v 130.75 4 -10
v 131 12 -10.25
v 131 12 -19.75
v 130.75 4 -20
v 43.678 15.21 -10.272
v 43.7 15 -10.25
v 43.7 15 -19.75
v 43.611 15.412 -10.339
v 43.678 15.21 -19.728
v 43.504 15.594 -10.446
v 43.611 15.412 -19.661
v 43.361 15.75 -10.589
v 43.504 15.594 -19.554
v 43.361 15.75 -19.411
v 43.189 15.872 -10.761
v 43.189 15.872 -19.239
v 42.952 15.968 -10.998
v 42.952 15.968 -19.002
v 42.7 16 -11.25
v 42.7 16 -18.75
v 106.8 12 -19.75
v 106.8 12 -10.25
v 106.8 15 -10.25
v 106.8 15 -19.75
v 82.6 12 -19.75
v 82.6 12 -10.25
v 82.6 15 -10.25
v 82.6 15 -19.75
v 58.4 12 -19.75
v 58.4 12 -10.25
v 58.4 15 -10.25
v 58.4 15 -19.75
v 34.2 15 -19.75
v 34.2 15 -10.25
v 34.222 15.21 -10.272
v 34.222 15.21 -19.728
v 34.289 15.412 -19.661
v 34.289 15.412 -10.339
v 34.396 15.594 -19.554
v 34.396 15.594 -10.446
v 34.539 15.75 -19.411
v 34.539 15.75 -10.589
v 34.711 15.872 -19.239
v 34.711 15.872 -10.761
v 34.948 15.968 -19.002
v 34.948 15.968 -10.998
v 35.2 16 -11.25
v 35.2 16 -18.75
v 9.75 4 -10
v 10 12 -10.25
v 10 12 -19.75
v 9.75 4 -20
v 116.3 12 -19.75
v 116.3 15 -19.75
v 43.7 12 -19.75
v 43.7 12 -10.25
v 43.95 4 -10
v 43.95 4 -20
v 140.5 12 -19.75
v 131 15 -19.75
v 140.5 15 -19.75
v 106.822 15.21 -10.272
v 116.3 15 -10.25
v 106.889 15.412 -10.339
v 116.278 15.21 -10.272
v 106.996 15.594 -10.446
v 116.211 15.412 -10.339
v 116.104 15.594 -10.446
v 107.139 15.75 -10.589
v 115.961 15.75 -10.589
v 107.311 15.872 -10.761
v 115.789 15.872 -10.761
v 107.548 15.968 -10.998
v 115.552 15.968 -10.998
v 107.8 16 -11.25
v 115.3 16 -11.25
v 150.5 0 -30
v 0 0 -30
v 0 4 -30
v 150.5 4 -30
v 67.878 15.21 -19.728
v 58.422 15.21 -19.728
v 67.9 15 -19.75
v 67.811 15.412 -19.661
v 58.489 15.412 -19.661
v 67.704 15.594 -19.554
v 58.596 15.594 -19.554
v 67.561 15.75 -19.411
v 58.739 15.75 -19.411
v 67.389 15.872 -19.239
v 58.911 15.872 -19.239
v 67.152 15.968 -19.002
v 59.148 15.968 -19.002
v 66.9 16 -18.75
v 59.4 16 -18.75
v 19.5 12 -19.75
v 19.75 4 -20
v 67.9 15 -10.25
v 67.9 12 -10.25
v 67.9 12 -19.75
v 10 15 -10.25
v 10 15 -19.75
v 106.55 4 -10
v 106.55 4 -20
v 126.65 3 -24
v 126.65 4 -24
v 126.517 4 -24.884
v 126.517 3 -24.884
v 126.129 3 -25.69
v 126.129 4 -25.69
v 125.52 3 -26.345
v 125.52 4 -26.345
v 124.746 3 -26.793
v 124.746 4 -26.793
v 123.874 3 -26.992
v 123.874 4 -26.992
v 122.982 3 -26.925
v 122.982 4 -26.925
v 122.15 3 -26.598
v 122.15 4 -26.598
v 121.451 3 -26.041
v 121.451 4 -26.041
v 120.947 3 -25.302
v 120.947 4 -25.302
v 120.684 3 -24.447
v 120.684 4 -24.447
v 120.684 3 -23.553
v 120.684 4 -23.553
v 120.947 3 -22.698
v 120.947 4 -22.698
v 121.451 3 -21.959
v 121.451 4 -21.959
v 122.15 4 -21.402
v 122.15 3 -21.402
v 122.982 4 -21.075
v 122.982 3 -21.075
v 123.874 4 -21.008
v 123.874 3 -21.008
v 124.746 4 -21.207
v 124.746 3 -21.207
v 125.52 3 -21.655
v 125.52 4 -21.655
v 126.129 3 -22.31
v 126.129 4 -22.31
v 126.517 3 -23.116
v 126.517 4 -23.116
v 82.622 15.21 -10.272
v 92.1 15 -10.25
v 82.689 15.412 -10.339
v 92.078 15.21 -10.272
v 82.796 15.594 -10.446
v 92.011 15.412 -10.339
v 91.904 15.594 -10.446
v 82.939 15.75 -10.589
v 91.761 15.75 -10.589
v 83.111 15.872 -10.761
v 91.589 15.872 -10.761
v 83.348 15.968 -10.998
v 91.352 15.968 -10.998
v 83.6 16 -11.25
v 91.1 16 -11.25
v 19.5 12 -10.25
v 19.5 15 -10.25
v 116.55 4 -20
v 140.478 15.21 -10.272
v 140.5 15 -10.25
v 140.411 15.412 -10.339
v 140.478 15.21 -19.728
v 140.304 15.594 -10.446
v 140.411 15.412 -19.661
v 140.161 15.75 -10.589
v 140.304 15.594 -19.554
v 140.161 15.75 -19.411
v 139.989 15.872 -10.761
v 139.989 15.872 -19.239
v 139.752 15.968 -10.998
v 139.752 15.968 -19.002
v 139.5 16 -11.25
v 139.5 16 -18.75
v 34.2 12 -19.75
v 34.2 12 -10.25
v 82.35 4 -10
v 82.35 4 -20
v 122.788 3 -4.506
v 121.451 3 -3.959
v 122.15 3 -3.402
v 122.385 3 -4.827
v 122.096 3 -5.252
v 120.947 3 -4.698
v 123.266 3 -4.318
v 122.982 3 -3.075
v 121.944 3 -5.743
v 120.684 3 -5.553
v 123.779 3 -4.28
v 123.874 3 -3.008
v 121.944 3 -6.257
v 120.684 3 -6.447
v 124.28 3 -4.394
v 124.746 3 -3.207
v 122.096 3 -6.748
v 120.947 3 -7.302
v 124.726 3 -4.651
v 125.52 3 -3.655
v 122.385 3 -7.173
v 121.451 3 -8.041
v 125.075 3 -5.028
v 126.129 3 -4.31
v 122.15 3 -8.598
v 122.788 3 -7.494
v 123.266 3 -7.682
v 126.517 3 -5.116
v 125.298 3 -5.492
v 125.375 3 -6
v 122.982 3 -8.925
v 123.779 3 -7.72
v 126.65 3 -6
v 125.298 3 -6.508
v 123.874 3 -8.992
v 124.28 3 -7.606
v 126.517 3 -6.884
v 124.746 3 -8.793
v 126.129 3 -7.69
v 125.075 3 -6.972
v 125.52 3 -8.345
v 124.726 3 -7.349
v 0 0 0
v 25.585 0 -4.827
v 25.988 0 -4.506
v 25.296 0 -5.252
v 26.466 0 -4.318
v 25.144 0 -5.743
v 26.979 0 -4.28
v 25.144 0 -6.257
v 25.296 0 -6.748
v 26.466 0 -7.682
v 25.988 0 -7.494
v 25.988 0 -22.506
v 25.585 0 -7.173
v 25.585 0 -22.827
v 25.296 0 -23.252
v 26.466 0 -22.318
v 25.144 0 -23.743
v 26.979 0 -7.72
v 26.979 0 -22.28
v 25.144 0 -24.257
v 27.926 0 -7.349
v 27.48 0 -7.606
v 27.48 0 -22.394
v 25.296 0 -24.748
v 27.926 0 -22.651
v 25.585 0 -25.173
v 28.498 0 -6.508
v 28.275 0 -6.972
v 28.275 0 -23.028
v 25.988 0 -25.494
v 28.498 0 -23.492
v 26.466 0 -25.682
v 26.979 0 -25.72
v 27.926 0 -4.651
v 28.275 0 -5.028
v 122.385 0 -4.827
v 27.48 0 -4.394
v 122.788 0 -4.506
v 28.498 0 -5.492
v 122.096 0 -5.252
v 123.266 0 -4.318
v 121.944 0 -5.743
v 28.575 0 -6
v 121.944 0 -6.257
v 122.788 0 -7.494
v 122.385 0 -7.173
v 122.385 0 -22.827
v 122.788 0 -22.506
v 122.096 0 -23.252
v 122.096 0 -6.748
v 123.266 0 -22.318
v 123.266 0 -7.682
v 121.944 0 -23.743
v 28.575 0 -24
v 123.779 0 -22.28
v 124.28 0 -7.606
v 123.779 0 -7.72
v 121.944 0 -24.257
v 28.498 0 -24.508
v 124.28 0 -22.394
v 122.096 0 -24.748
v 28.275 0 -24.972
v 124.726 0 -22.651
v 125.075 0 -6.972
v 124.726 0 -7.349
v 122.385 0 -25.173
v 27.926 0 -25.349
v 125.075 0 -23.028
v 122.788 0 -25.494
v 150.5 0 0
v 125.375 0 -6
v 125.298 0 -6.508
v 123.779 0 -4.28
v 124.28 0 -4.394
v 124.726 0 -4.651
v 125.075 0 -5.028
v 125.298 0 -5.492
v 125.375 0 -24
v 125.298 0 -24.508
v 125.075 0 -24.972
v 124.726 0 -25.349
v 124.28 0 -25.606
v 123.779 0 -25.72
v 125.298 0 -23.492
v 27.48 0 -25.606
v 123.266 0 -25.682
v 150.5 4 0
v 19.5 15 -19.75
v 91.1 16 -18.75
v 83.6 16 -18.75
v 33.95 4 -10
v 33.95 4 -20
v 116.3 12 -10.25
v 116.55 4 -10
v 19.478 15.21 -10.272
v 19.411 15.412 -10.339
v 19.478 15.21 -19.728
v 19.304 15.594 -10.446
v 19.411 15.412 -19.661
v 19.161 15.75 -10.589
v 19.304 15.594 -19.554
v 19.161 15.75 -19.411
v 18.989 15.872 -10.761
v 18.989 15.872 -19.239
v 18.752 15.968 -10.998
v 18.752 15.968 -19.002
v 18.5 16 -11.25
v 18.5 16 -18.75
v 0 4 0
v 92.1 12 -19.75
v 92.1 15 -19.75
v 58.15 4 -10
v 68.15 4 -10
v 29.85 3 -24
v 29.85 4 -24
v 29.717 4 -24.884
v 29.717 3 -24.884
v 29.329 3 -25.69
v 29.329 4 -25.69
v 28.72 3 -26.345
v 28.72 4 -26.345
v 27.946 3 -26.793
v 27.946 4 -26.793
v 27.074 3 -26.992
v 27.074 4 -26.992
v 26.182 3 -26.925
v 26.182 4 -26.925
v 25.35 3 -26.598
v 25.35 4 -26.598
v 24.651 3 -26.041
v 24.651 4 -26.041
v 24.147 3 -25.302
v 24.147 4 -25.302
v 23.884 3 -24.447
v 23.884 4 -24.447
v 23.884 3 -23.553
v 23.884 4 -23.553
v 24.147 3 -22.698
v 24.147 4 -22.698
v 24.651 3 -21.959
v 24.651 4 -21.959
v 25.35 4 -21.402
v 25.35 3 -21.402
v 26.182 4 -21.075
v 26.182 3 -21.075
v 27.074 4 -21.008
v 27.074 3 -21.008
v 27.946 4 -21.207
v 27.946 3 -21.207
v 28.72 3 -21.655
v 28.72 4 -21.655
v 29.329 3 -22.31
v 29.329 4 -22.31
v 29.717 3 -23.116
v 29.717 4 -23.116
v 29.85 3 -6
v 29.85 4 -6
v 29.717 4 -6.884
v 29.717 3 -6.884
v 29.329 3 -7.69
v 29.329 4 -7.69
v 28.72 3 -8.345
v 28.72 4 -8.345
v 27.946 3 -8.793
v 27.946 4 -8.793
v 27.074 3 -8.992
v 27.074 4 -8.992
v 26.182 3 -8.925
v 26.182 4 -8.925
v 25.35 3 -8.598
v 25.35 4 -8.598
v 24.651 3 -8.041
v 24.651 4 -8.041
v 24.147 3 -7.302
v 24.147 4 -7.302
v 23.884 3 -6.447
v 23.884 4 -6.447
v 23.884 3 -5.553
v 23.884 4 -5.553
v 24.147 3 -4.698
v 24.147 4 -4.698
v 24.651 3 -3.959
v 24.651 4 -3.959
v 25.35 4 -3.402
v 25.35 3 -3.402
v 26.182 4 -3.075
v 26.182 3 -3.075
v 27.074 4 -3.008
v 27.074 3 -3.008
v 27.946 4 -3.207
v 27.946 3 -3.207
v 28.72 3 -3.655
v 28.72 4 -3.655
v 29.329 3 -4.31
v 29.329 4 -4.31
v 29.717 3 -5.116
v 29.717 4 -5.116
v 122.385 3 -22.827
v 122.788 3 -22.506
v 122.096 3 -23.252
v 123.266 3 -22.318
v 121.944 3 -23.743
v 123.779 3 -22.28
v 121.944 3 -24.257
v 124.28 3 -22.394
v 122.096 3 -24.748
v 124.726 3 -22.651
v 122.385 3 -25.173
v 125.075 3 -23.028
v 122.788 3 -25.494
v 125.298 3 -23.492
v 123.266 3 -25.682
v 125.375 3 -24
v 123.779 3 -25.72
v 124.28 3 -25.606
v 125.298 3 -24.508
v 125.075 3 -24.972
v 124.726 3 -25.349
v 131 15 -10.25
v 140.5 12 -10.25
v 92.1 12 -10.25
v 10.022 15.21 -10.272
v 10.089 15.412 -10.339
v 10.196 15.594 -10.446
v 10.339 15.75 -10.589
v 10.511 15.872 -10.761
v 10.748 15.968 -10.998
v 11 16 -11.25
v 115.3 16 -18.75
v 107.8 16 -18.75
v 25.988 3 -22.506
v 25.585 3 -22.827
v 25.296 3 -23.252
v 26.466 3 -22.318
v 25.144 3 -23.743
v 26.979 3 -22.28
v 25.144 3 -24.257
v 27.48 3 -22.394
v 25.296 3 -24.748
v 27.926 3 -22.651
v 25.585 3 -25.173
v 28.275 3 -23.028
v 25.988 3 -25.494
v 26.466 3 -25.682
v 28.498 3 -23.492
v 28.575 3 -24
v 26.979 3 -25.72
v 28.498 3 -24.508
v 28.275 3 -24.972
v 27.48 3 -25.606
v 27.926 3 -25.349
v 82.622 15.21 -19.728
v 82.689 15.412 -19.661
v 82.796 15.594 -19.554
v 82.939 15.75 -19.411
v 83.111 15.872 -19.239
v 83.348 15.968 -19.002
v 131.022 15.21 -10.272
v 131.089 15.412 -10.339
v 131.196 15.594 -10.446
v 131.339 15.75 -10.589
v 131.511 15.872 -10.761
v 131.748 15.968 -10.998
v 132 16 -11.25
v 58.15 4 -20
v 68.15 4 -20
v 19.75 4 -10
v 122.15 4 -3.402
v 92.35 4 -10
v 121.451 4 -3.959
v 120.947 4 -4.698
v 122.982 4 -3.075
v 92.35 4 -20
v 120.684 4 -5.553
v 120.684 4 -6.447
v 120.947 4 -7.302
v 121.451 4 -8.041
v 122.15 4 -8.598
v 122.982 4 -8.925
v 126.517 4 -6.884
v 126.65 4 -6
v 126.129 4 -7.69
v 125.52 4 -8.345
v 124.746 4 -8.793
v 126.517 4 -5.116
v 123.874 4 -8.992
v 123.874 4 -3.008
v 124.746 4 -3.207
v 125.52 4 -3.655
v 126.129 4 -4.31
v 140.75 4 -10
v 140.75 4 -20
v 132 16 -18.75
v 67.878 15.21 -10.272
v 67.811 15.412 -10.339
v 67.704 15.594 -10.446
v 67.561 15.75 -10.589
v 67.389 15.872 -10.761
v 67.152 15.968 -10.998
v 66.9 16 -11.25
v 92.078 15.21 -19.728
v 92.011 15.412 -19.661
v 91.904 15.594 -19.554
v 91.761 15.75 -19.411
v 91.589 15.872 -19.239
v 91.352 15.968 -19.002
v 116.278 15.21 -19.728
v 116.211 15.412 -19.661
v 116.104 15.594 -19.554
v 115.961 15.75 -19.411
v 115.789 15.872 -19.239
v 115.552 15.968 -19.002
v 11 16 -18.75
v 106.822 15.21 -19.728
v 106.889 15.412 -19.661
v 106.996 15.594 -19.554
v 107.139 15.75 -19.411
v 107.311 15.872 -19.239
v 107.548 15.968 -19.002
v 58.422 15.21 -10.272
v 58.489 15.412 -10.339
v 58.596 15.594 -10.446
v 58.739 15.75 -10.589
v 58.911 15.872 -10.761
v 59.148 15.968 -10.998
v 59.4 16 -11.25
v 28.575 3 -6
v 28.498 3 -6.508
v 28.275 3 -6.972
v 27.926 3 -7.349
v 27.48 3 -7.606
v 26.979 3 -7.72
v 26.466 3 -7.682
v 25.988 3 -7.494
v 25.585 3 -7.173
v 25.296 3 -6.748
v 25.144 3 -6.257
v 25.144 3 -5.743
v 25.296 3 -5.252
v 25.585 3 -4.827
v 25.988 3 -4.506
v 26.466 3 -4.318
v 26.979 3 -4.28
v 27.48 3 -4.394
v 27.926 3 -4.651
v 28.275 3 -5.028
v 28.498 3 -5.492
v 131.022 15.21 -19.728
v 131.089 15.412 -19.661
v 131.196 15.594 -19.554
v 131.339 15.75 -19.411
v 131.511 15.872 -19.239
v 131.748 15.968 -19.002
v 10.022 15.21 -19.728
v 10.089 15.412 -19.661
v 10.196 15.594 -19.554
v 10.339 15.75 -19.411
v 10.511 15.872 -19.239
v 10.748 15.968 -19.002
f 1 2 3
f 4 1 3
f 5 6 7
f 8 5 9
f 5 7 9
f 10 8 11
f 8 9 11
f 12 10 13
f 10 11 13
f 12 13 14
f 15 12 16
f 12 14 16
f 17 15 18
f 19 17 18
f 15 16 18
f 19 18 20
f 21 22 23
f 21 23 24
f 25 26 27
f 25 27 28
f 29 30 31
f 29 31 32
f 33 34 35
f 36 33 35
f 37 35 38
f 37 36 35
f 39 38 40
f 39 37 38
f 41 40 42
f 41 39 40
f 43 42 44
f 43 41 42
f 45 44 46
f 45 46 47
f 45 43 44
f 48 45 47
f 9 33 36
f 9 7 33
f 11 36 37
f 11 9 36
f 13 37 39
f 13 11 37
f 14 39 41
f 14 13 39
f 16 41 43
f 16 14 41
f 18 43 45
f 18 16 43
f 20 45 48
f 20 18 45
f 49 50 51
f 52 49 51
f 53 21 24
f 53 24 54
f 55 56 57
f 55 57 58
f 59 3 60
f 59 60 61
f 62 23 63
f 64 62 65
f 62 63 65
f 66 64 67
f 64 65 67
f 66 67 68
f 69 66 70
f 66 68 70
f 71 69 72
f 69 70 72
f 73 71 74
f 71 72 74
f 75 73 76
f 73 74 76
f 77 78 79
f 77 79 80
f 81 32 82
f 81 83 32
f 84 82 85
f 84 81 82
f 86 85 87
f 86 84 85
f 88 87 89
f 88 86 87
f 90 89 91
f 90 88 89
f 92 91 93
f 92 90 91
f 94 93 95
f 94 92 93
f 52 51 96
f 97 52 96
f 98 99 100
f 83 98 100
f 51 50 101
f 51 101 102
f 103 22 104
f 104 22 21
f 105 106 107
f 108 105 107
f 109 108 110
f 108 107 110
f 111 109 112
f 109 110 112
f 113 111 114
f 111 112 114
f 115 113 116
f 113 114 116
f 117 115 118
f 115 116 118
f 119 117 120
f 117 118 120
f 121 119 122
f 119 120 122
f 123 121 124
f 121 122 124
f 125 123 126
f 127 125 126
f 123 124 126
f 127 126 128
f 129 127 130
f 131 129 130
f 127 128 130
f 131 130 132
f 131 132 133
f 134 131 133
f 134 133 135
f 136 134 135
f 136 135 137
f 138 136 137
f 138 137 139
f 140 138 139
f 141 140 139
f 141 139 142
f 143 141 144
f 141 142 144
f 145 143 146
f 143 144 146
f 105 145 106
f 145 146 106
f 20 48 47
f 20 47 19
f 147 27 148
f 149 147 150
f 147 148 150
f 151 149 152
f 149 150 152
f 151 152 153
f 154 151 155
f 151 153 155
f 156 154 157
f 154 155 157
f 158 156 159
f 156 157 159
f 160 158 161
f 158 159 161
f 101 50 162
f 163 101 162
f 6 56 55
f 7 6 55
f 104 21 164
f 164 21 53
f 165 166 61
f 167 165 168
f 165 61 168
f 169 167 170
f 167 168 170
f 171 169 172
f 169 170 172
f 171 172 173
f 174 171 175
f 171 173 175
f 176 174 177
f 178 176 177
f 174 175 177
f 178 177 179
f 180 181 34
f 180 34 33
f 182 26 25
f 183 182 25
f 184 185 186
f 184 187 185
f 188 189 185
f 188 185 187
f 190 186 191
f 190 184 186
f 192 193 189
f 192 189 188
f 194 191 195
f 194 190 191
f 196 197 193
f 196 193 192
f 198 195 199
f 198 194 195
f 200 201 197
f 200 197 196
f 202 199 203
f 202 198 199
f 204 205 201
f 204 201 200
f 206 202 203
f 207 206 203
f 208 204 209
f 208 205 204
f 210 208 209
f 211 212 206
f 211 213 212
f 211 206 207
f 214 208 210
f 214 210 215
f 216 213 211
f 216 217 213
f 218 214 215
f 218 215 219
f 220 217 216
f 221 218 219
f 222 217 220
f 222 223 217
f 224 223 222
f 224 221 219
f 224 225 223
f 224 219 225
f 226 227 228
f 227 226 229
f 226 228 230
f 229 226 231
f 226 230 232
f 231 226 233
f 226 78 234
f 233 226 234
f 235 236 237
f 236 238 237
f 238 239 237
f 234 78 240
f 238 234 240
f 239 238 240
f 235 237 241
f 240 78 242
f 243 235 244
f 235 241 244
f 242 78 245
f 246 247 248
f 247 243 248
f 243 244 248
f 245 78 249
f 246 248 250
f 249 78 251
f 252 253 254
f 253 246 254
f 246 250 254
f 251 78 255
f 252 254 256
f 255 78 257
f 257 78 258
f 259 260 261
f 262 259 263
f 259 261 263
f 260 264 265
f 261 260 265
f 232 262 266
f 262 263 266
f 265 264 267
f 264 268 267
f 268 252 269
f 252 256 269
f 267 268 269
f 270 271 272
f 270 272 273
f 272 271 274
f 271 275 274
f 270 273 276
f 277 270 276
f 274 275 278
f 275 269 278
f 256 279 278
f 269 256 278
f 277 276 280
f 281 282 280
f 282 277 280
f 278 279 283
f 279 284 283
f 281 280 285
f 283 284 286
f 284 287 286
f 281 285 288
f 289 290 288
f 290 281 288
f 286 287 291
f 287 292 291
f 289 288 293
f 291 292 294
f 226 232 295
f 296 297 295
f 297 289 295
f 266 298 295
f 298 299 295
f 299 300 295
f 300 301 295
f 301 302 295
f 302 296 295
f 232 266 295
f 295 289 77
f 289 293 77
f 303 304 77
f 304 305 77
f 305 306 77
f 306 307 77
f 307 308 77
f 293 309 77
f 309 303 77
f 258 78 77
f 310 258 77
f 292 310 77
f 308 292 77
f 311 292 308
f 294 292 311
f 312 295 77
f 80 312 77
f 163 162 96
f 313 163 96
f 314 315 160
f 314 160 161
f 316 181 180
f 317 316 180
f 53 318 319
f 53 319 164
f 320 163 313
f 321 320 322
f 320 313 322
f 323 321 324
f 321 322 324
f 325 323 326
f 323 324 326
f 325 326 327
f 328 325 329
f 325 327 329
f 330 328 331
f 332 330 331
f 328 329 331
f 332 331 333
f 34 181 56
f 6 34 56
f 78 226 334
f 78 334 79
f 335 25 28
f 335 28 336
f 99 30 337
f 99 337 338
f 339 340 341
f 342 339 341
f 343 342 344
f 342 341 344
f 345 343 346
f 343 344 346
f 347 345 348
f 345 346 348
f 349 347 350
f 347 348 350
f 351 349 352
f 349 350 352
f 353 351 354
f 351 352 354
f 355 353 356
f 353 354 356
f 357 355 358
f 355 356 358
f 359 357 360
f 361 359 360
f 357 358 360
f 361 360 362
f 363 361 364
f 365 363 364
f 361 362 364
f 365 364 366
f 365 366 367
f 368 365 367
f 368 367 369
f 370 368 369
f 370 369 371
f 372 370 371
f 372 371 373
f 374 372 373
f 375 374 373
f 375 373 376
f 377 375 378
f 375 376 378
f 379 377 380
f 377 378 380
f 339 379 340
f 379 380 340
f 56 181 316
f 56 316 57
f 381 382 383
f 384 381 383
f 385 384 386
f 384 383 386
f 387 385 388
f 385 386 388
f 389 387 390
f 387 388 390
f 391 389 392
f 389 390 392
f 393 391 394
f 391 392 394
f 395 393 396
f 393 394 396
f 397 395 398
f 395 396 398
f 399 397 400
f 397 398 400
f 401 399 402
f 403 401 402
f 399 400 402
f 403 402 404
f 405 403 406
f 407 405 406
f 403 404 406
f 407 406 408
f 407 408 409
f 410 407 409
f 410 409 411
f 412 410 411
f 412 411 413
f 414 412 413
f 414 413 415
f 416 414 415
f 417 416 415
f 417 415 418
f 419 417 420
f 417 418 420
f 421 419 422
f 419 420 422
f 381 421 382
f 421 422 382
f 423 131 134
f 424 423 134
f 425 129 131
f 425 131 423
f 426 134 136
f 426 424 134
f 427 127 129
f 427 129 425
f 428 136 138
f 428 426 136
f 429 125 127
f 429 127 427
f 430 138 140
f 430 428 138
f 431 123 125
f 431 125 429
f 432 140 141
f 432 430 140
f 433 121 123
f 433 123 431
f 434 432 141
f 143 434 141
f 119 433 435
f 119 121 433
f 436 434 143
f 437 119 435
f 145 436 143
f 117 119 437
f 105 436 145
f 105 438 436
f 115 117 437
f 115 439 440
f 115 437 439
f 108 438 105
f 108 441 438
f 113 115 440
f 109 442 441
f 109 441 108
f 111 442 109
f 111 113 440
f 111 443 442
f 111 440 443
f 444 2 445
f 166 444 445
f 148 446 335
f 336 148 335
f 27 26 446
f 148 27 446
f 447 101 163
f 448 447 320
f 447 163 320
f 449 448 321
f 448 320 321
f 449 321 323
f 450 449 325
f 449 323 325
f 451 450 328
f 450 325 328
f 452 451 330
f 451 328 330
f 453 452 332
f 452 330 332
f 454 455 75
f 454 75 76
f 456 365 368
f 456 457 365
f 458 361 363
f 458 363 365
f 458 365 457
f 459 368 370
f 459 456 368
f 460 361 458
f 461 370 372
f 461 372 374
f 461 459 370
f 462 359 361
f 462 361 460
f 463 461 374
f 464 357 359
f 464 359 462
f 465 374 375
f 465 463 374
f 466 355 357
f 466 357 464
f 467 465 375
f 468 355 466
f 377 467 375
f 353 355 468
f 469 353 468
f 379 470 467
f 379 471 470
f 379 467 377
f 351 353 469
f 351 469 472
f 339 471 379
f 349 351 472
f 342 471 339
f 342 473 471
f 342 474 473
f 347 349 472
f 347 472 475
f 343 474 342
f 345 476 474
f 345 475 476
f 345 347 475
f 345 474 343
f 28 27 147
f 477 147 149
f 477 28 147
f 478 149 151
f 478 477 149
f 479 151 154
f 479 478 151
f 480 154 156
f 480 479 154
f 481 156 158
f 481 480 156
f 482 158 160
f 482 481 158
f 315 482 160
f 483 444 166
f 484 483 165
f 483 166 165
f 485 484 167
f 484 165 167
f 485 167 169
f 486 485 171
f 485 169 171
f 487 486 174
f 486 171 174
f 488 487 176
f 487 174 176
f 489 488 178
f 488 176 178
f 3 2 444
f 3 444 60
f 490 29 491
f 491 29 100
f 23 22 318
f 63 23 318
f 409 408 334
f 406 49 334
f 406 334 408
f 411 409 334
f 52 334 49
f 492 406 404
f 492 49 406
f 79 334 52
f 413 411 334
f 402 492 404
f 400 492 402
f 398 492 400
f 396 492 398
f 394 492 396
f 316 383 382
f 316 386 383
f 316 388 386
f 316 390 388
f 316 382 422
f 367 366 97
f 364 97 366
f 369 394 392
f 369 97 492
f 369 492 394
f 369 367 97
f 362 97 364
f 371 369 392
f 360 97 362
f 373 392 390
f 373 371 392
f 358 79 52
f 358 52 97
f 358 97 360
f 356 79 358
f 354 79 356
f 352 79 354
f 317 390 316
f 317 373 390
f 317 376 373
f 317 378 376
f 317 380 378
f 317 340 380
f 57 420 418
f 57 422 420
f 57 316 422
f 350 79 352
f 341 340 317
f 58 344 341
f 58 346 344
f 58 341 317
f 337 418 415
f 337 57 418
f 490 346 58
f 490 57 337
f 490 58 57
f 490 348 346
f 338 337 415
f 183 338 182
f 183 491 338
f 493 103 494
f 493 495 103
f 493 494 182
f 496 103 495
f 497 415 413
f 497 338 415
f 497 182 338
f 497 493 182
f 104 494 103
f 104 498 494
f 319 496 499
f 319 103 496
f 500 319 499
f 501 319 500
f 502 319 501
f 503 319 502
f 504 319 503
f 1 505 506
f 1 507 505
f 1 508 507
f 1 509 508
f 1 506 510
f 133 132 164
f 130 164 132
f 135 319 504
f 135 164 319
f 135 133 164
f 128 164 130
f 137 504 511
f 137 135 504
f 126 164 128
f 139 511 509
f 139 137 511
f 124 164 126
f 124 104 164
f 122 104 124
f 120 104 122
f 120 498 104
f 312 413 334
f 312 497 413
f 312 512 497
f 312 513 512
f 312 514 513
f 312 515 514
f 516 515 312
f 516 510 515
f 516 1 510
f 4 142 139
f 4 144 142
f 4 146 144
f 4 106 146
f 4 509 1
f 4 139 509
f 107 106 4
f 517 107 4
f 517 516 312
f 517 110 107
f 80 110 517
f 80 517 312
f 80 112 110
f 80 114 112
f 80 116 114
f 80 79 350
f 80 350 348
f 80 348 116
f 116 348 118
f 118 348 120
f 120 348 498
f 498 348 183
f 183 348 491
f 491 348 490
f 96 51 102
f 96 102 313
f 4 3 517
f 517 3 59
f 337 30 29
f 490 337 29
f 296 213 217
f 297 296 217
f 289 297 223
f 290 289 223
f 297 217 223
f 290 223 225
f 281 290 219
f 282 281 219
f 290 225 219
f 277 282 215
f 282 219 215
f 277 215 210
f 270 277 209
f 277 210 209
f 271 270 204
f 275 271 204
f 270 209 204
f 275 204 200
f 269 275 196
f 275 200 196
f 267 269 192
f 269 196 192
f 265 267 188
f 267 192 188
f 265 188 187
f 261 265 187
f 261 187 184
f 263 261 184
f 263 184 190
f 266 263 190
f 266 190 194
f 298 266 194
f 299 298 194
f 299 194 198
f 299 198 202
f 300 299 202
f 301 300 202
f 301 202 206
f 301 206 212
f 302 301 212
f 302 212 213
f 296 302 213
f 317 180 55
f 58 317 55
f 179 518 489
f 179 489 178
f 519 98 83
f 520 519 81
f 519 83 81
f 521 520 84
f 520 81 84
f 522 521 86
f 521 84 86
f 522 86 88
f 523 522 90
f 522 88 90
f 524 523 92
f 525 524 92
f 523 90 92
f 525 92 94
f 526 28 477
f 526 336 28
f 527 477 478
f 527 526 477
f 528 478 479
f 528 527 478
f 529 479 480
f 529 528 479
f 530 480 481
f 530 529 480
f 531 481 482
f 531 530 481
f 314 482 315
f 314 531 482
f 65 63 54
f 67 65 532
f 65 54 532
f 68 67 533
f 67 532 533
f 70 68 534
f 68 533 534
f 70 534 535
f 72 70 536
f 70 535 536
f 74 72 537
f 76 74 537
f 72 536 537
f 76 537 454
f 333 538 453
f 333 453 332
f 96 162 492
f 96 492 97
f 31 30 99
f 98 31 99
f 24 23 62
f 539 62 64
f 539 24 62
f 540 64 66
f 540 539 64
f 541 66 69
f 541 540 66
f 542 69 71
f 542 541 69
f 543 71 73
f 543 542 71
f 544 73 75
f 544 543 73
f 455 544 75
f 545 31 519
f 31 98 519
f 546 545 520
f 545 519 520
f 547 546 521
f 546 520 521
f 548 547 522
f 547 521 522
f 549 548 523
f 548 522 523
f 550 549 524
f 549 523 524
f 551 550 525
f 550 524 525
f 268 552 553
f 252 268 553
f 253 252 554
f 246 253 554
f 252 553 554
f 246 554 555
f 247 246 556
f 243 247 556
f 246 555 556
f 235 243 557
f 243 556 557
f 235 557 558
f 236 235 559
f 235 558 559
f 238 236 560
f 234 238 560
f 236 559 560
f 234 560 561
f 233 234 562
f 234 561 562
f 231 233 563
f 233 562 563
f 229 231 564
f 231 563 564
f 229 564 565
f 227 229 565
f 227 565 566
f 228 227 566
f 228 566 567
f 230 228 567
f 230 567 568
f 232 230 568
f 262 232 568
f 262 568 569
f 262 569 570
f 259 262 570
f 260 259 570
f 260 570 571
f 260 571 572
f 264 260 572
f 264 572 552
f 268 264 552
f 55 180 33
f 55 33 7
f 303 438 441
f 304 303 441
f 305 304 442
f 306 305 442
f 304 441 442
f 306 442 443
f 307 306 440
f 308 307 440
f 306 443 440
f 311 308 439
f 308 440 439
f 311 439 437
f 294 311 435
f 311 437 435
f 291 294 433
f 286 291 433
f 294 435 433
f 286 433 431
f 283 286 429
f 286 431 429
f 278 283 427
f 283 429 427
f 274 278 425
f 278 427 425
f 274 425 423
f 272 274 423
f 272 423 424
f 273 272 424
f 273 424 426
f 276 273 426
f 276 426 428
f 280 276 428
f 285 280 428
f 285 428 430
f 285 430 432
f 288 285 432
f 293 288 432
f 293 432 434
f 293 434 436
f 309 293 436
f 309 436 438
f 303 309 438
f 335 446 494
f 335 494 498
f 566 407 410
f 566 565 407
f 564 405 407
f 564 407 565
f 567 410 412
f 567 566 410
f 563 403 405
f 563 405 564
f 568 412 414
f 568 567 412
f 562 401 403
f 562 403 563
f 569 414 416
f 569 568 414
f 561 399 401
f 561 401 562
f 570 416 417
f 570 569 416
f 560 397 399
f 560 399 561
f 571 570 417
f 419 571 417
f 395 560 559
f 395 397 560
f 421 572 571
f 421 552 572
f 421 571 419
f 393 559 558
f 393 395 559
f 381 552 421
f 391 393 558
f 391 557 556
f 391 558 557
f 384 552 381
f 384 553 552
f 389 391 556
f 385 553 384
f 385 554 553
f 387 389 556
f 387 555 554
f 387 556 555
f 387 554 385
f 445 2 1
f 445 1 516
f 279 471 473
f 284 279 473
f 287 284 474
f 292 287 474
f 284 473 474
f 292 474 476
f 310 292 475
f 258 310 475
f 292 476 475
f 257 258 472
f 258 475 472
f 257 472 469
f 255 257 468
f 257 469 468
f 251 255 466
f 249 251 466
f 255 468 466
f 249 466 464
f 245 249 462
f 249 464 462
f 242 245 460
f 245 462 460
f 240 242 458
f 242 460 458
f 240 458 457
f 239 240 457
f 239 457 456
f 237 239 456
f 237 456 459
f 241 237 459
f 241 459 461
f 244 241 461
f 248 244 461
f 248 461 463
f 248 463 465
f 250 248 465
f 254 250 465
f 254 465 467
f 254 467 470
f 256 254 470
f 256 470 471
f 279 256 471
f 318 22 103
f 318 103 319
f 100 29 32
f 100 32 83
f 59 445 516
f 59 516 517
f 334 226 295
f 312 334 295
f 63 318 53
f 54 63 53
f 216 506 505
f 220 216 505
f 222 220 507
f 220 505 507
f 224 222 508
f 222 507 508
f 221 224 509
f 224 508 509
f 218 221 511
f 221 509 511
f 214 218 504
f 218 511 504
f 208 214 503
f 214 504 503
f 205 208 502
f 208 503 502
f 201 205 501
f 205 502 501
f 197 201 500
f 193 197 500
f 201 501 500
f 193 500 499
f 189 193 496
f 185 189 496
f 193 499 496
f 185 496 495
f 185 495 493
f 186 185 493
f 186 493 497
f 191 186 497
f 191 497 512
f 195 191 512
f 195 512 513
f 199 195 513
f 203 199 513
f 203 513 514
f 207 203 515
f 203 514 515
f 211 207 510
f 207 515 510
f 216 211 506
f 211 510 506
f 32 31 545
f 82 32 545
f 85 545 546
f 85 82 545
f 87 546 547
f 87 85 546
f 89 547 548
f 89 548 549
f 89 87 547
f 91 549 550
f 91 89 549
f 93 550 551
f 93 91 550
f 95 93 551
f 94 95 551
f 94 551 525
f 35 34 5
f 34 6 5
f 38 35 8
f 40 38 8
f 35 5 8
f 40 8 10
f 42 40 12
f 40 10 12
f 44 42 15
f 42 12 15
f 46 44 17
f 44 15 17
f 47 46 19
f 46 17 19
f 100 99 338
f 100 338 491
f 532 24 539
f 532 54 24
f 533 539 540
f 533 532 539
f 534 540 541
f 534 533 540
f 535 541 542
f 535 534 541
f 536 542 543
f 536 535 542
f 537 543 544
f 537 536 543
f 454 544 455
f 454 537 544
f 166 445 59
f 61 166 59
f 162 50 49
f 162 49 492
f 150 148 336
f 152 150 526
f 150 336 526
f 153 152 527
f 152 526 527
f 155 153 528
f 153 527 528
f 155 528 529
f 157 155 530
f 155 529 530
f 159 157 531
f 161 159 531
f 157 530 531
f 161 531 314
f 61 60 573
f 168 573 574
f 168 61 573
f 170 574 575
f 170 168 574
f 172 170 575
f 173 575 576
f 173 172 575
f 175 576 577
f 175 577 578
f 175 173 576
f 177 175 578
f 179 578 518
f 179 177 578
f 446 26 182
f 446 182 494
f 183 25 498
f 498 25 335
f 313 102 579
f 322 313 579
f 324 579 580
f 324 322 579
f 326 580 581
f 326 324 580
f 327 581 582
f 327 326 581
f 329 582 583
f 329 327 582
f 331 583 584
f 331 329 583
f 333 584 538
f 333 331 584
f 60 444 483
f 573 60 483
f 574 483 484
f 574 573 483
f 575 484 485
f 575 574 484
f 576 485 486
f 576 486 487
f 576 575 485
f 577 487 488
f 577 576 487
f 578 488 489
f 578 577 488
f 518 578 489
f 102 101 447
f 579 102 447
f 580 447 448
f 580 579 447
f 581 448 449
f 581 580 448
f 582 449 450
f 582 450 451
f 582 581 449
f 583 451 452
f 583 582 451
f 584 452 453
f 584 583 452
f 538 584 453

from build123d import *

# Parameters (mm, degrees)
SKETCH1_W                = 150.5
SKETCH1_H                = 30
SKETCH1_W_2              = 9.5
SKETCH1_H_2              = 9.5
BOSS_EXTRUDE1_DEPTH      = 4
SKETCH2_W                = 9.5
SKETCH2_H                = 9.5
BOSS_EXTRUDE2_DEPTH      = 12
BOSS_EXTRUDE2_DEPTH_BACK = 4
FILLET1_R                = 1
CHAMFER1_SIZE            = 0.25
CHAMFER1_SIZE2           = 8
SKETCH3_R                = 1.725
CUT_EXTRUDE1_DEPTH       = 5
SKETCH4_R                = 3
CUT_EXTRUDE2_DEPTH       = 1


with BuildPart() as part:
    # Sketch1 → Boss-Extrude1 (new body)
    with BuildSketch(Plane(origin=(0, 0, 0), x_dir=(1, 0, 0), z_dir=(0, 1, 0))):
        with Locations((75.25, 15)):
            Rectangle(SKETCH1_W, SKETCH1_H)
        with Locations((14.75, 15)):
            Rectangle(SKETCH1_W_2, SKETCH1_H_2, mode=Mode.SUBTRACT)
        with Locations((38.95, 15)):
            Rectangle(SKETCH1_W_2, SKETCH1_H_2, mode=Mode.SUBTRACT)
        with Locations((63.15, 15)):
            Rectangle(SKETCH1_W_2, SKETCH1_H_2, mode=Mode.SUBTRACT)
        with Locations((87.35, 15)):
            Rectangle(SKETCH1_W_2, SKETCH1_H_2, mode=Mode.SUBTRACT)
        with Locations((111.55, 15)):
            Rectangle(SKETCH1_W_2, SKETCH1_H_2, mode=Mode.SUBTRACT)
        with Locations((135.75, 15)):
            Rectangle(SKETCH1_W_2, SKETCH1_H_2, mode=Mode.SUBTRACT)
    extrude(amount=BOSS_EXTRUDE1_DEPTH)

    # Sketch2 → Boss-Extrude2 (add, two sides)
    with BuildSketch(Plane(origin=(0, 4, 0), x_dir=(1, 0, 0), z_dir=(0, 1, 0))) as boss_extrude2_sk:
        with Locations((14.75, 15)):
            Rectangle(SKETCH2_W, SKETCH2_H)
        with Locations((38.95, 15)):
            Rectangle(SKETCH2_W, SKETCH2_H)
        with Locations((63.15, 15)):
            Rectangle(SKETCH2_W, SKETCH2_H)
        with Locations((87.35, 15)):
            Rectangle(SKETCH2_W, SKETCH2_H)
        with Locations((111.55, 15)):
            Rectangle(SKETCH2_W, SKETCH2_H)
        with Locations((135.75, 15)):
            Rectangle(SKETCH2_W, SKETCH2_H)
    extrude(amount=BOSS_EXTRUDE2_DEPTH)
    extrude(boss_extrude2_sk.sketch, amount=-BOSS_EXTRUDE2_DEPTH_BACK)

    # Fillet1
    fillet1_edges = [part.edges().sort_by_distance(p)[0] for p in [
        (10, 16, -15),
        (14.75, 16, -10.25),
        (19.5, 16, -15),
        (14.75, 16, -19.75),
        (34.2, 16, -15),
        (38.95, 16, -10.25),
        (43.7, 16, -15),
        (38.95, 16, -19.75),
        (58.4, 16, -15),
        (63.15, 16, -10.25),
        (67.9, 16, -15),
        (63.15, 16, -19.75),
        (82.6, 16, -15),
        (87.35, 16, -10.25),
        (92.1, 16, -15),
        (87.35, 16, -19.75),
        (106.8, 16, -15),
        (111.55, 16, -10.25),
        (116.3, 16, -15),
        (111.55, 16, -19.75),
        (140.5, 16, -15),
        (135.75, 16, -19.75),
        (131, 16, -15),
        (135.75, 16, -10.25),
    ]]
    fillet(fillet1_edges, radius=FILLET1_R)

    # Chamfer1
    chamfer1_edges = [part.edges().sort_by_distance(p)[0] for p in [
        (10, 4, -15),
        (14.75, 4, -10.25),
        (19.5, 4, -15),
        (14.75, 4, -19.75),
        (58.4, 4, -15),
        (63.15, 4, -10.25),
        (67.9, 4, -15),
        (63.15, 4, -19.75),
        (34.2, 4, -15),
        (38.95, 4, -10.25),
        (43.7, 4, -15),
        (38.95, 4, -19.75),
        (82.6, 4, -15),
        (87.35, 4, -10.25),
        (92.1, 4, -15),
        (87.35, 4, -19.75),
        (106.8, 4, -15),
        (111.55, 4, -10.25),
        (116.3, 4, -15),
        (111.55, 4, -19.75),
        (140.5, 4, -15),
        (135.75, 4, -19.75),
        (131, 4, -15),
        (135.75, 4, -10.25),
    ]]
    chamfer1_side = [part.faces().sort_by_distance(p)[0] for p in [
        (75.25, 4, -15),
    ]]
    chamfer(chamfer1_edges, length=CHAMFER1_SIZE, length2=CHAMFER1_SIZE2, reference=chamfer1_side[0])

    # Sketch3 → Cut-Extrude1 (cut, through all)
    with BuildSketch(Plane(origin=(0, 4, 0), x_dir=(1, 0, 0), z_dir=(0, 1, 0))):
        with Locations((26.85, 6)):
            Circle(SKETCH3_R)
        with Locations((26.85, 24)):
            Circle(SKETCH3_R)
        with Locations((123.65, 6)):
            Circle(SKETCH3_R)
        with Locations((123.65, 24)):
            Circle(SKETCH3_R)
    extrude(amount=-CUT_EXTRUDE1_DEPTH, mode=Mode.SUBTRACT)

    # Sketch4 → Cut-Extrude2 (cut)
    with BuildSketch(Plane(origin=(0, 4, 0), x_dir=(1, 0, 0), z_dir=(0, 1, 0))):
        with Locations((26.85, 24)):
            Circle(SKETCH4_R)
        with Locations((26.85, 6)):
            Circle(SKETCH4_R)
        with Locations((123.65, 6)):
            Circle(SKETCH4_R)
        with Locations((123.65, 24)):
            Circle(SKETCH4_R)
    extrude(amount=-CUT_EXTRUDE2_DEPTH, mode=Mode.SUBTRACT)


solid = part.part
